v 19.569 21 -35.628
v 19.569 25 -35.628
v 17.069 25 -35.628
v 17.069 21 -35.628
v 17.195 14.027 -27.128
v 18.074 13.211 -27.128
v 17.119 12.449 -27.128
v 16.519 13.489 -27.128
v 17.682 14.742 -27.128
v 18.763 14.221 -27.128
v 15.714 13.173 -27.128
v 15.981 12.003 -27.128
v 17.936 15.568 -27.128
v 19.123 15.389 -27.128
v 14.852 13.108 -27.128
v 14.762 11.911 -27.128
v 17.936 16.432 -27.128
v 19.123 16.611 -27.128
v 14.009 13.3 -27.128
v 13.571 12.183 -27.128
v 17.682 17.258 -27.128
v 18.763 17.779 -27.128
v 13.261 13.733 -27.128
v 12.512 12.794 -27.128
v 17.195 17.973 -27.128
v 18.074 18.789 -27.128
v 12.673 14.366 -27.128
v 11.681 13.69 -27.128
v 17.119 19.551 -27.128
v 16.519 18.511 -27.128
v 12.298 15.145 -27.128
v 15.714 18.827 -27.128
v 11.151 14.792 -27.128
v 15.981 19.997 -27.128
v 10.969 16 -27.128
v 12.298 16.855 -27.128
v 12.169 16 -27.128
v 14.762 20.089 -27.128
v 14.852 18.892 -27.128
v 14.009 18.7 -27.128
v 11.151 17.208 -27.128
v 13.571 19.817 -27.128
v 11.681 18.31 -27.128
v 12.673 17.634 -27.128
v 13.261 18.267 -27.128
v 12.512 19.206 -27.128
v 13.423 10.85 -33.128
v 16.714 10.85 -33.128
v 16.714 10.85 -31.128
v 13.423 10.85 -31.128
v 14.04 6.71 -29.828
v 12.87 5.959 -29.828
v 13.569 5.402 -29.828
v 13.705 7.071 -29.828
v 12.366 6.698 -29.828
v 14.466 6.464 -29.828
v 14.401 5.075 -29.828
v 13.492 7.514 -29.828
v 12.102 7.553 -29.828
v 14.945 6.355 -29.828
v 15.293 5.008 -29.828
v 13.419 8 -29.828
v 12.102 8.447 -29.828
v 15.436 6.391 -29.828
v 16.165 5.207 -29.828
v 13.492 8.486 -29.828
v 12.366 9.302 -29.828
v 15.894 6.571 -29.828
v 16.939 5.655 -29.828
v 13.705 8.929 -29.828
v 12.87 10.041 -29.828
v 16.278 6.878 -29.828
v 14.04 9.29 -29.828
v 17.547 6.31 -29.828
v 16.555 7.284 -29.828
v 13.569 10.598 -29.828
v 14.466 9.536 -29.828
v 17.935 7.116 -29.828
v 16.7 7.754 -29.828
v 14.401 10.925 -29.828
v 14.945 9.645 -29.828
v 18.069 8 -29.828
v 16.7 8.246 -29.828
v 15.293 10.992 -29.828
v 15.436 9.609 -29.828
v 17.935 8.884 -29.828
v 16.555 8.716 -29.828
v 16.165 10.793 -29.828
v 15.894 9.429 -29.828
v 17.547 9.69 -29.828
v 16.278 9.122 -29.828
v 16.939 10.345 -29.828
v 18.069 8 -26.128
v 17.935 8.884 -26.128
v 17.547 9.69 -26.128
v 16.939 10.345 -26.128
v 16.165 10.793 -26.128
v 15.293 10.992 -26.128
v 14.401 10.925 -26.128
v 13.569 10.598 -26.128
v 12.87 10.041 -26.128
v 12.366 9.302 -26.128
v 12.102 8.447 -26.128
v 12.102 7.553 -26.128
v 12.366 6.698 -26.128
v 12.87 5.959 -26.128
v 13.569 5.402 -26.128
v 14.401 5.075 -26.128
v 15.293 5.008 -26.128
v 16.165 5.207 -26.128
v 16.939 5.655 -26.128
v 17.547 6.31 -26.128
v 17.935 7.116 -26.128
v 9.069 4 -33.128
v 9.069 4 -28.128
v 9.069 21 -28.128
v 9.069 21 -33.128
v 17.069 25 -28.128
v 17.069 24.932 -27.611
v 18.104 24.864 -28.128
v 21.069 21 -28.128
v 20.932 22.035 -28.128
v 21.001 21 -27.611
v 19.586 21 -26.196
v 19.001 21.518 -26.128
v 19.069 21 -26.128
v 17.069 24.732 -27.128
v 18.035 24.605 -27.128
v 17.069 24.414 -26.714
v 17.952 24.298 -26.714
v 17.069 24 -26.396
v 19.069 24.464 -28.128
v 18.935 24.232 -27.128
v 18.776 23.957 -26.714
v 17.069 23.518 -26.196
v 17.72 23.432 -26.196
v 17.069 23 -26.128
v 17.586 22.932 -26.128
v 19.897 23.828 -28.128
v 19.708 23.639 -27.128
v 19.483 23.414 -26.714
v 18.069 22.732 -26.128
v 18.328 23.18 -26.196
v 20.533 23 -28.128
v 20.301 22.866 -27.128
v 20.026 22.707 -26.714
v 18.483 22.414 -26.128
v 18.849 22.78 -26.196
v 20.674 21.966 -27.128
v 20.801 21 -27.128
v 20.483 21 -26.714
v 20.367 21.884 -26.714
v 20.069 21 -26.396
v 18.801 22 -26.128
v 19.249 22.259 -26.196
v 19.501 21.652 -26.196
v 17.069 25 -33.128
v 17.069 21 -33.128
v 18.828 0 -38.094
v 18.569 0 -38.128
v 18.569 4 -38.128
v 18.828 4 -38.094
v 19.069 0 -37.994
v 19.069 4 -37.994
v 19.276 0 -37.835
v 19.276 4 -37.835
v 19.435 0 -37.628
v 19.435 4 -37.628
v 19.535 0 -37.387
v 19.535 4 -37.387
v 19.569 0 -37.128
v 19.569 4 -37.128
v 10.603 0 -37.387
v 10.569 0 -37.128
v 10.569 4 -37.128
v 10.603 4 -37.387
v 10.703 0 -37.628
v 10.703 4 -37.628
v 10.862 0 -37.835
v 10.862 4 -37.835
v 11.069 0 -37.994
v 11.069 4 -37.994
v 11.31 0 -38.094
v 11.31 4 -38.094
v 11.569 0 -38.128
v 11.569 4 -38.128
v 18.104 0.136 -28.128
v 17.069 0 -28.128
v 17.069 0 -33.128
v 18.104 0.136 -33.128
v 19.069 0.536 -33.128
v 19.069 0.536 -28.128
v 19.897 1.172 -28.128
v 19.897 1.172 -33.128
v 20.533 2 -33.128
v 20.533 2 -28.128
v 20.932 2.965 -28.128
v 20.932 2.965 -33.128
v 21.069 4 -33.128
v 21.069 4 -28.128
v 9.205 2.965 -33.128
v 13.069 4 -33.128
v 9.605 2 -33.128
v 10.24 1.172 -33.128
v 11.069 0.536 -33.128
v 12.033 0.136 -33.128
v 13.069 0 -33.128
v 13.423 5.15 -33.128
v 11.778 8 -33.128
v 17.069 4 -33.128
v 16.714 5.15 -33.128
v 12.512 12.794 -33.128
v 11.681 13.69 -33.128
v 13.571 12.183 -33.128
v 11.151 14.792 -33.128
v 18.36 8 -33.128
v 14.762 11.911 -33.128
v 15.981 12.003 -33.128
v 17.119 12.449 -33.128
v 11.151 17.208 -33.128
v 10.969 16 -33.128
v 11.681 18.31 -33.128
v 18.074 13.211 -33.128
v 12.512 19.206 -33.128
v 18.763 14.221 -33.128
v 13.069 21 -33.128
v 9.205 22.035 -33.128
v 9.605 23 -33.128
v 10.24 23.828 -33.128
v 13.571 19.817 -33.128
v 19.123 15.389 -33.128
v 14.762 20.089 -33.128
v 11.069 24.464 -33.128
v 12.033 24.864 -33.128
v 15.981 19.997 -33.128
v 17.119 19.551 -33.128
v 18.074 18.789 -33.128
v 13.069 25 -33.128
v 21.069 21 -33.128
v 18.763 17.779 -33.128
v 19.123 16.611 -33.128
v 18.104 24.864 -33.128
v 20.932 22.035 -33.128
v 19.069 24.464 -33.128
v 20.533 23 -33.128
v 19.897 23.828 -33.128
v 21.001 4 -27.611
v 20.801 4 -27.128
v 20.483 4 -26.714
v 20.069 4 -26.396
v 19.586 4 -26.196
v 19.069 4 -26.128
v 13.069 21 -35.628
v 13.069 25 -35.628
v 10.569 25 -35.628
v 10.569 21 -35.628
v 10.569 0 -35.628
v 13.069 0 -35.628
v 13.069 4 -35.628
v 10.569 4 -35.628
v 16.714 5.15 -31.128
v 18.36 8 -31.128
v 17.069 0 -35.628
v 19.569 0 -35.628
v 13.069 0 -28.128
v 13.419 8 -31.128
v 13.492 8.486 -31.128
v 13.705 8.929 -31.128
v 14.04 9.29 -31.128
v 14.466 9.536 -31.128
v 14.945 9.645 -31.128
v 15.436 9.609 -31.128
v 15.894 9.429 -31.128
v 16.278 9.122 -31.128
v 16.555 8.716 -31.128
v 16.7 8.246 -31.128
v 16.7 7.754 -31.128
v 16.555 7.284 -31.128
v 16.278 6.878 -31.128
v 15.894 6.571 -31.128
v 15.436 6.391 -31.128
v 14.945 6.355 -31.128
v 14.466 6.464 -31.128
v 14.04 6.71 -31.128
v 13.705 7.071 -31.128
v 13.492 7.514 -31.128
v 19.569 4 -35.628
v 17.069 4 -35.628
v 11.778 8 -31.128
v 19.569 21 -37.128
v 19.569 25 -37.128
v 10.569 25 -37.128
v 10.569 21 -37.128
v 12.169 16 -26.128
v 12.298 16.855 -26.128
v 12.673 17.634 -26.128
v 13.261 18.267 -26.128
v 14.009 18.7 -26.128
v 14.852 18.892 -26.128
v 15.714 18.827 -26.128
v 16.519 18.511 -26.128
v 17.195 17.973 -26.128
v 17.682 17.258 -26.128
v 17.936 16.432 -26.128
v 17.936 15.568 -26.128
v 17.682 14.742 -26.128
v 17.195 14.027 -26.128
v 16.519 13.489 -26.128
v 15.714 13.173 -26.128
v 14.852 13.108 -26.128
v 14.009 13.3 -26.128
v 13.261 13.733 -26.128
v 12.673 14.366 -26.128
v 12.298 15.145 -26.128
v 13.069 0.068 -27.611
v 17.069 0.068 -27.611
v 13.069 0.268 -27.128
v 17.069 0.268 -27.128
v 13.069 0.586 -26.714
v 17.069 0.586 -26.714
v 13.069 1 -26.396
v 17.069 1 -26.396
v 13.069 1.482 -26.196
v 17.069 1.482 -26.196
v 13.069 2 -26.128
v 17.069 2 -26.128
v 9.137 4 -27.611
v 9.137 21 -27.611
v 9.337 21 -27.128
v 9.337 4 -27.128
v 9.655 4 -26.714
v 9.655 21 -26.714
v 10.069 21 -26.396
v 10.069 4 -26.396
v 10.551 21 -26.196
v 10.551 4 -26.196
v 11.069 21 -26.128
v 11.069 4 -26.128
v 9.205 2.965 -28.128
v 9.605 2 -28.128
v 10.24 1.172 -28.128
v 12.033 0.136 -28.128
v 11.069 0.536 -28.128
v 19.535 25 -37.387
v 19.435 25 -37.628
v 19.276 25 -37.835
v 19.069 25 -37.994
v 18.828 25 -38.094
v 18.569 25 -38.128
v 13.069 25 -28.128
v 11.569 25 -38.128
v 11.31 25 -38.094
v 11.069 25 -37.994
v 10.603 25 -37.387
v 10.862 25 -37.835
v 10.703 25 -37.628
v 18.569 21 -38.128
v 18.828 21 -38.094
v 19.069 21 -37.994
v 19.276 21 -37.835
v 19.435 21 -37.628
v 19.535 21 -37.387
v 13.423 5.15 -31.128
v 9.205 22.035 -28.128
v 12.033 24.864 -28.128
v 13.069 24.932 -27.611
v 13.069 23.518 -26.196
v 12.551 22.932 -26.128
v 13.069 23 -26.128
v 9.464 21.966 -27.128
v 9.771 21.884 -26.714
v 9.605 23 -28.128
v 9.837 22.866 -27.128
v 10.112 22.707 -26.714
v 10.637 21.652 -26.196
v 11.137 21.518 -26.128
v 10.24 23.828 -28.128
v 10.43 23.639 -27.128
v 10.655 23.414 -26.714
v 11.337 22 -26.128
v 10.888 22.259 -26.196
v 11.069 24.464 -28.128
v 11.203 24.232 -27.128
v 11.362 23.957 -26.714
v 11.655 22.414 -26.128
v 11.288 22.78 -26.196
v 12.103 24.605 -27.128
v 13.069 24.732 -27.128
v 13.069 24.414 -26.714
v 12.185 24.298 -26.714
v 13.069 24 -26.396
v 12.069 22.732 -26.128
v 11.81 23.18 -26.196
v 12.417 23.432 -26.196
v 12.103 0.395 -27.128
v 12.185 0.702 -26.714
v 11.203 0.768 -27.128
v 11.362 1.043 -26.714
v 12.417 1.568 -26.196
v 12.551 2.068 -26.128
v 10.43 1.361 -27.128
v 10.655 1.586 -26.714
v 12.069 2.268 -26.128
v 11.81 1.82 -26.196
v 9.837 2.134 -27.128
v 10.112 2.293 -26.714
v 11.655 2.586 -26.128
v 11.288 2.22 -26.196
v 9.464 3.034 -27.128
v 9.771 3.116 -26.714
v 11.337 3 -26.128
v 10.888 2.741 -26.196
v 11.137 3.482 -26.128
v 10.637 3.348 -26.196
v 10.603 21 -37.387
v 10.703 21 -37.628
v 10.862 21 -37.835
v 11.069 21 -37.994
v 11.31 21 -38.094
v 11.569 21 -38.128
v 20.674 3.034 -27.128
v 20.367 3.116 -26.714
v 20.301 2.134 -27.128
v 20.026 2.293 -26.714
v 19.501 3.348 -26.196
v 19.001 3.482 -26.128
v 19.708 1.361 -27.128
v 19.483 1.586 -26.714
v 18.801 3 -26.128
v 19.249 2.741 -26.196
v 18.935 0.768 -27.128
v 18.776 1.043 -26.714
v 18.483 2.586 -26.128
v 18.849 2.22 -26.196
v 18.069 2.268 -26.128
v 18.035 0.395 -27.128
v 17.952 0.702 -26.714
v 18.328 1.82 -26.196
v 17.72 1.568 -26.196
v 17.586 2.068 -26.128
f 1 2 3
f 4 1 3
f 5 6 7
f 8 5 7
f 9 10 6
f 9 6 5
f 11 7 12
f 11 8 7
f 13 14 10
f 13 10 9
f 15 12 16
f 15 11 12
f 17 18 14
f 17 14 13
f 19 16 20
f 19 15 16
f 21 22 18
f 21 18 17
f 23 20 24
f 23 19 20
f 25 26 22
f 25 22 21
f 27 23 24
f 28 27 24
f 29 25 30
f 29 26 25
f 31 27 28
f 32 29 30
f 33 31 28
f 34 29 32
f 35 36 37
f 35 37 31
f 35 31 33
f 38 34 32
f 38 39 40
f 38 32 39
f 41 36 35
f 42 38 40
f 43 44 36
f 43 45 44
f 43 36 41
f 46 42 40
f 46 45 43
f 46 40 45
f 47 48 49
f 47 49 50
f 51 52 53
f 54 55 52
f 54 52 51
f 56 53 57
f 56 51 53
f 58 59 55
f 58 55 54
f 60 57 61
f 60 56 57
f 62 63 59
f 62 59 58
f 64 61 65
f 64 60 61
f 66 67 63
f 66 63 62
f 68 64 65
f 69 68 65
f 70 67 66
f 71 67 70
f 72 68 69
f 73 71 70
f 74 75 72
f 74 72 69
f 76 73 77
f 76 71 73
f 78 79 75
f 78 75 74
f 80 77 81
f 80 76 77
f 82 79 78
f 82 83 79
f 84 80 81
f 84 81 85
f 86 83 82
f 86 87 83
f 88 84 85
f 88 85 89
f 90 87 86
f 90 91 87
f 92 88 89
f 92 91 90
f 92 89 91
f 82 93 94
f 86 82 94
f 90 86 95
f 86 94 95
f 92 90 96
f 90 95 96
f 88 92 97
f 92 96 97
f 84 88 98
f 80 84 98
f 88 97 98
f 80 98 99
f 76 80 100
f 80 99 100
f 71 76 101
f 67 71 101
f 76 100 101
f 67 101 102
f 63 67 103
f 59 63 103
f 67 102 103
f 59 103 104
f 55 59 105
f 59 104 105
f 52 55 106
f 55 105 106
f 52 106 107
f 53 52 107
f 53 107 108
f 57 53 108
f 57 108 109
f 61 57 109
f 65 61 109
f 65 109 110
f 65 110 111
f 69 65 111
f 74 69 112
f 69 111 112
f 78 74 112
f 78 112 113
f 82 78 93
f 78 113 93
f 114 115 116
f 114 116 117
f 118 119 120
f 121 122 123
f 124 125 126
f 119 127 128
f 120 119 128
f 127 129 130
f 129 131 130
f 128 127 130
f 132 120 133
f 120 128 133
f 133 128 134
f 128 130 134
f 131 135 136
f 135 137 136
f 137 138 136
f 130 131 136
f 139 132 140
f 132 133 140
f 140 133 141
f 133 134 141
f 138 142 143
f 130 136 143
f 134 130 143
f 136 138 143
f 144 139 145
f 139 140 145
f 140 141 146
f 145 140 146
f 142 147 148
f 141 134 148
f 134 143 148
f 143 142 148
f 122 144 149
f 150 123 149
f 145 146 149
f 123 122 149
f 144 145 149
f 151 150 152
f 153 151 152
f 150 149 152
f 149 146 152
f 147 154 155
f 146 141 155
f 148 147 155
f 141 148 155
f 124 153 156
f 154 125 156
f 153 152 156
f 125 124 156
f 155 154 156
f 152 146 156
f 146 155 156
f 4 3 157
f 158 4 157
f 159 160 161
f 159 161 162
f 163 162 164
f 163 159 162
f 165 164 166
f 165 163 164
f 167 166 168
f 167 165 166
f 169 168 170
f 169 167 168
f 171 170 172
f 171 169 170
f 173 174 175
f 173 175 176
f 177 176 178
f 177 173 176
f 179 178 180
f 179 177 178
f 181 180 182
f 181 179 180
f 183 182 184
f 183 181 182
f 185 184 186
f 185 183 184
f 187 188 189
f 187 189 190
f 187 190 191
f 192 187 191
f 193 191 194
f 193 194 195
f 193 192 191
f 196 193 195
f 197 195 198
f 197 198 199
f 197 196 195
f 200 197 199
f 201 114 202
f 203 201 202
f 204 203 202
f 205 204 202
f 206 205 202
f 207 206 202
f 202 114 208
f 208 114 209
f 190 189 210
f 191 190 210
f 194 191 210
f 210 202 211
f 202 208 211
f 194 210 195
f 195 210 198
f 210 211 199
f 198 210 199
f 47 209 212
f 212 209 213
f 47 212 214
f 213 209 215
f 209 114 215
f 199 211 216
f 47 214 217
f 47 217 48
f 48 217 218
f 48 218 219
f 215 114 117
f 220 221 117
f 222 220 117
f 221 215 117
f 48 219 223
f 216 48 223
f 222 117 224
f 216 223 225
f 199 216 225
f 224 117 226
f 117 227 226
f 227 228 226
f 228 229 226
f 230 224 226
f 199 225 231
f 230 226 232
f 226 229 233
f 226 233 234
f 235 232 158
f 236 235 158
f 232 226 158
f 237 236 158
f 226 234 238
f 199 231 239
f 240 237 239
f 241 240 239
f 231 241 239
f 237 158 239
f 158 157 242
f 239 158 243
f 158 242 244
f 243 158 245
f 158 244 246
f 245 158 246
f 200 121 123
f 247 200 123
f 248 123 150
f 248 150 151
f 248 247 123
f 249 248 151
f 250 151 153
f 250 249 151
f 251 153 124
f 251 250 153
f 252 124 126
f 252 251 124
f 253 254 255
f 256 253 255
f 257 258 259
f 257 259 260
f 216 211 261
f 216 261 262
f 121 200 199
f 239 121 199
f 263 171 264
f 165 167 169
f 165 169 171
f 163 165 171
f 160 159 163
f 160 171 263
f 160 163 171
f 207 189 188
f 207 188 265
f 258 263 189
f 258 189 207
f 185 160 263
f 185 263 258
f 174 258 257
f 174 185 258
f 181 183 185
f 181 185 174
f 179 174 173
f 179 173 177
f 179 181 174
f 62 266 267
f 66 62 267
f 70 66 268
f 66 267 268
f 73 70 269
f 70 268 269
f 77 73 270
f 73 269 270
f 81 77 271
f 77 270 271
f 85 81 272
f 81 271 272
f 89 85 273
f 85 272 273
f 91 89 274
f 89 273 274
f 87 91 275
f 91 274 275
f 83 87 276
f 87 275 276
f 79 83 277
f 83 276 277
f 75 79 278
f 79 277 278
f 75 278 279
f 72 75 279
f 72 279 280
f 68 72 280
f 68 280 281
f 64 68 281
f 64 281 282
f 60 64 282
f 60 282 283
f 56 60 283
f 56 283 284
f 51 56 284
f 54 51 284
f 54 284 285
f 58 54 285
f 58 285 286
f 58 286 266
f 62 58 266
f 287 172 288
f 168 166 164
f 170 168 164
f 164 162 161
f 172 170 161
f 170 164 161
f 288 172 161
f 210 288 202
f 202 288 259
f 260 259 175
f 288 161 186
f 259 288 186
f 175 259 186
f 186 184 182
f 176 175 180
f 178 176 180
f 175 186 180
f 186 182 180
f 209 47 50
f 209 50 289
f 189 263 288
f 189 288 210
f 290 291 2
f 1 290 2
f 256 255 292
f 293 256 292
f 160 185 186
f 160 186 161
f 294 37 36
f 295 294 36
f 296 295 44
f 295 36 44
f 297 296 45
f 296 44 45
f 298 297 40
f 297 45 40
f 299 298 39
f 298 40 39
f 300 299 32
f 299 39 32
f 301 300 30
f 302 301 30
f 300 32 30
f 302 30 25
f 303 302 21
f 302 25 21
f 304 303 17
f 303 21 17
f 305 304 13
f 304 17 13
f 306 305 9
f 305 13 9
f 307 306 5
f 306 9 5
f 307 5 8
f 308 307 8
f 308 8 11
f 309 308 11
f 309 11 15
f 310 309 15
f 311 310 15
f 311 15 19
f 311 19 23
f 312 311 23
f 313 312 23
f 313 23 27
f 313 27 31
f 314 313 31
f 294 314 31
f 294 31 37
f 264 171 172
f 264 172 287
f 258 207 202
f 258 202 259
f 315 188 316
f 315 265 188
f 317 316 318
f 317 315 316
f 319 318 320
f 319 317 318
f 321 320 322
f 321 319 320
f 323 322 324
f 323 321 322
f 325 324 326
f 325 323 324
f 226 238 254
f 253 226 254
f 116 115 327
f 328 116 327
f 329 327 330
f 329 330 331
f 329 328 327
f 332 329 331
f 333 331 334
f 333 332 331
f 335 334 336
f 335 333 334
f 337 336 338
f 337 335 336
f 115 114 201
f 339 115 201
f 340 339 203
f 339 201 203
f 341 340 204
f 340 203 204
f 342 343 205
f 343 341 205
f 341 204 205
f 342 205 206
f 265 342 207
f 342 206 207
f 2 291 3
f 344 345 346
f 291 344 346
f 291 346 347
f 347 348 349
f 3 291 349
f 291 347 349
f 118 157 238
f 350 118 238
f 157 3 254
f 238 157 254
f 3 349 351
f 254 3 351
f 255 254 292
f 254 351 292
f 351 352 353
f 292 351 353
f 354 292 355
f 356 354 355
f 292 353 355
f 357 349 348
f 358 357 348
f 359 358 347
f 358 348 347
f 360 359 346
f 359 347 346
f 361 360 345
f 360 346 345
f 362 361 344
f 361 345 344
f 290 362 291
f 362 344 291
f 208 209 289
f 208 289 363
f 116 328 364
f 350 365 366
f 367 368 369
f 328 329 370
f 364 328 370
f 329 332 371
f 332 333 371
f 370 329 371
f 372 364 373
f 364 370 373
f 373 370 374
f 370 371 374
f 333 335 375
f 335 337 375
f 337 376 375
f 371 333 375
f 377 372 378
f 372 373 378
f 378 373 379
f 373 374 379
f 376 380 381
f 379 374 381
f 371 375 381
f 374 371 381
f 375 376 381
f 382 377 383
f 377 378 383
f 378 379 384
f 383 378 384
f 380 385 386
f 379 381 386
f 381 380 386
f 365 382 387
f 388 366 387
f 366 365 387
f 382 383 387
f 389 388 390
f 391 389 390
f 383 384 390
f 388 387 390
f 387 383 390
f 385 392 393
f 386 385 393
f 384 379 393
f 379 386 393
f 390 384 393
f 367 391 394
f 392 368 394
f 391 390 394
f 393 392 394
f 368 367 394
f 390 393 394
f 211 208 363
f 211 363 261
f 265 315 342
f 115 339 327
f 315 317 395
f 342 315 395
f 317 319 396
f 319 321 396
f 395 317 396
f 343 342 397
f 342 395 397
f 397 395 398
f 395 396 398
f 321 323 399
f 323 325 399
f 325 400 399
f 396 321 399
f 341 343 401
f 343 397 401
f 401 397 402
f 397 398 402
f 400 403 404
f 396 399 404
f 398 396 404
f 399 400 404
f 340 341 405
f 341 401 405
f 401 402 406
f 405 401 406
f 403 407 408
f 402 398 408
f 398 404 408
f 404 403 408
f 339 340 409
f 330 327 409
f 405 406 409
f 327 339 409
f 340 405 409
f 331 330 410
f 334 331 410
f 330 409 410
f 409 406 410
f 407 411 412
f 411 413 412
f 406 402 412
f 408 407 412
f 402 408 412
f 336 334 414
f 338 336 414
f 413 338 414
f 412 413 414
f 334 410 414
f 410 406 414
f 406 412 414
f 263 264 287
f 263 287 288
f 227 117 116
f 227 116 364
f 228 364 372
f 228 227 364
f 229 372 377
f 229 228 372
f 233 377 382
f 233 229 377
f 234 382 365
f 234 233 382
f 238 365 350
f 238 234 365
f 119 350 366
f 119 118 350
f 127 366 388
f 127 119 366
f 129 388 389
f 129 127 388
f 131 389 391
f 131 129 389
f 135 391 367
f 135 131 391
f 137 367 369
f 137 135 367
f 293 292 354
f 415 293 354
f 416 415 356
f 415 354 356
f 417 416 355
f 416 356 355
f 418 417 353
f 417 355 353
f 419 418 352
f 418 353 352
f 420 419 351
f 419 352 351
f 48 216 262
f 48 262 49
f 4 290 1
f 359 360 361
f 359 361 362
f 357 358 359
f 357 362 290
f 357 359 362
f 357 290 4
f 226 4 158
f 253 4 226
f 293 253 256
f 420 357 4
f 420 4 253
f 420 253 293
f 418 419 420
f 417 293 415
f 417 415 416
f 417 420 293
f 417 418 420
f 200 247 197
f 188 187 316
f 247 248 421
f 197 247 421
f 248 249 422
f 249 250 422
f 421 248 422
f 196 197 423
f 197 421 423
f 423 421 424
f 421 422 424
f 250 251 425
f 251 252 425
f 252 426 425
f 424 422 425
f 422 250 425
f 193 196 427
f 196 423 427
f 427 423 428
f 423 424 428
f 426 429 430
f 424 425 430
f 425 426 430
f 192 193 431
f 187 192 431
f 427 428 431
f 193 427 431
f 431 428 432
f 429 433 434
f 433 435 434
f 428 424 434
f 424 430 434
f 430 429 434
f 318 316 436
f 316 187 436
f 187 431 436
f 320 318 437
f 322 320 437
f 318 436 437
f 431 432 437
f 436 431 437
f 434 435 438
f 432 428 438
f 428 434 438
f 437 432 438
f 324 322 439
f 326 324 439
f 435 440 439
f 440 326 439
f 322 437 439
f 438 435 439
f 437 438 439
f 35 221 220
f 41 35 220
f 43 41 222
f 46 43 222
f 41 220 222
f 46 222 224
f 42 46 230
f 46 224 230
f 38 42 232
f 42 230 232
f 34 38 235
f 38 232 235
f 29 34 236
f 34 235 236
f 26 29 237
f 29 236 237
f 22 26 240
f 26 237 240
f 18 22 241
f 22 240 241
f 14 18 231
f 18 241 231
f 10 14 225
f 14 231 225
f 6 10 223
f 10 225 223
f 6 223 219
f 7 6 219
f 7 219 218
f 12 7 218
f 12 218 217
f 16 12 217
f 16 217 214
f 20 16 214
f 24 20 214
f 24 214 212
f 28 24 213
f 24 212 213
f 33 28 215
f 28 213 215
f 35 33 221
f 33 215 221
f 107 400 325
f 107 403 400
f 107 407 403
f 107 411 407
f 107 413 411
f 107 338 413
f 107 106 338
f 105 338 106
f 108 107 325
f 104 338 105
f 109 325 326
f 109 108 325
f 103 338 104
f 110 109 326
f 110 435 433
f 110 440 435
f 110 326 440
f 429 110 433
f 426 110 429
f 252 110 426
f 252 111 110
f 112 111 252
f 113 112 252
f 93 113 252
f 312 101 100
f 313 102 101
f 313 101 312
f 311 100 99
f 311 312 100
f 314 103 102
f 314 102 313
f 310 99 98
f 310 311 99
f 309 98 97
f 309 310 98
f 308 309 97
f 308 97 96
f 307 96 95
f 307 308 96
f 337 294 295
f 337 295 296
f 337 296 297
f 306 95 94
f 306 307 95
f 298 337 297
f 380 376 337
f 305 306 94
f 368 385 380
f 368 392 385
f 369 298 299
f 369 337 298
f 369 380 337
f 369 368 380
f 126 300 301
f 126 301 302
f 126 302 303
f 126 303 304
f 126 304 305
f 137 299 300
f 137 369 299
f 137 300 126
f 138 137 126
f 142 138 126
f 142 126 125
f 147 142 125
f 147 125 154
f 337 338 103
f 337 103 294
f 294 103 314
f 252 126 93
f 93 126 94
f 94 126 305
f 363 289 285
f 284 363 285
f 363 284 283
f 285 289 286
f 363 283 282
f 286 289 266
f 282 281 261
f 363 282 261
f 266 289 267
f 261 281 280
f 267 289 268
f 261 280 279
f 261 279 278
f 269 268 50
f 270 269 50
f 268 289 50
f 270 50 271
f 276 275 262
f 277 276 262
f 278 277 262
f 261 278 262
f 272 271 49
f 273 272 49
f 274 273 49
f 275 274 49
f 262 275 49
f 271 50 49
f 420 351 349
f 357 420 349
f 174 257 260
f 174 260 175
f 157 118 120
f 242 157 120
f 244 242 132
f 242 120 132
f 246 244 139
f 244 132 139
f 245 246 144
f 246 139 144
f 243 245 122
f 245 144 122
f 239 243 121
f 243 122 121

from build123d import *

# Parameters (mm, degrees)
BOSS_EXTRU_3_DEPTH      = 4
ESQUISSE3_W             = 12
ESQUISSE3_H             = 7
BOSS_EXTRU_4_DEPTH      = 8.5
ENL_V_MAT_EXTRU_1_REACH = 9
ESQUISSE4_R             = 1.65
ESQUISSE4_R_2           = 2.9
ESQUISSE5_R             = 4.1
ENL_V_MAT_EXTRU_2_DEPTH = 6
CONG_1_R                = 4
CONG_2_R                = 2
ESQUISSE6_R             = 3
ENL_V_MAT_EXTRU_3_DEPTH = 3.7
ENL_V_MAT_EXTRU_4_DEPTH = 2


with BuildPart() as part:
    # Esquisse2 → Boss.-Extru.3 (new body)
    with BuildSketch(Plane(origin=(0, 0, 0), x_dir=(1, 0, 0), z_dir=(0, 1, 0))):
        with BuildLine():
            Line((11.568725398, 38.128215269), (18.568725398, 38.128215269))
            ThreePointArc((18.568725398, 38.128215269), (19.275832179, 37.83532205), (19.568725398, 37.128215269))
            Line((19.568725398, 37.128215269), (19.568725398, 35.628215269))
            Line((19.568725398, 35.628215269), (17.068725398, 35.628215269))
            Line((17.068725398, 35.628215269), (17.068725398, 33.128215269))
            Line((17.068725398, 33.128215269), (21.068725398, 33.128215269))
            Line((21.068725398, 33.128215269), (21.068725398, 26.128215269))
            Line((21.068725398, 26.128215269), (9.068725398, 26.128215269))
            Line((9.068725398, 26.128215269), (9.068725398, 33.128215269))
            Line((9.068725398, 33.128215269), (13.068725398, 33.128215269))
            Line((13.068725398, 33.128215269), (13.068725398, 35.628215269))
            Line((13.068725398, 35.628215269), (10.568725398, 35.628215269))
            Line((10.568725398, 35.628215269), (10.568725398, 37.128215269))
            ThreePointArc((10.568725398, 37.128215269), (10.861618616, 37.83532205), (11.568725398, 38.128215269))
        make_face()
    extrude(amount=BOSS_EXTRU_3_DEPTH)

    # Esquisse3 → Boss.-Extru.4 (add)
    with BuildSketch(Plane(origin=(0, 4, 0), x_dir=(1, 0, 0), z_dir=(0, 1, 0))):
        with Locations((15.068725398, 29.628215269)):
            Rectangle(ESQUISSE3_W, ESQUISSE3_H)
    extrude(amount=BOSS_EXTRU_4_DEPTH)

    # Symétrie1: part across plane


with BuildPart() as part_1:
    add(part.part)
    add(part.part.mirror(Plane.ZX.offset(12.5)))

    # Esquisse4 → Enlèv. mat.-Extru.1 (cut, up to next)
    with BuildSketch(Plane(origin=(0, 0, -33.128215269), x_dir=(-1, 0, 0), z_dir=(0, 0, -1)), mode=Mode.PRIVATE) as enl_v_mat_extru_1_sk1:
        with Locations((-15.068725398, 8)):
            Circle(ESQUISSE4_R)
    enl_v_mat_extru_1_tool1 = extrude(enl_v_mat_extru_1_sk1.sketch, amount=-ENL_V_MAT_EXTRU_1_REACH, mode=Mode.PRIVATE) & part_1.part
    add(enl_v_mat_extru_1_tool1.solids().sort_by_distance((15.068725, 8, -33.128215))[0], mode=Mode.SUBTRACT)
    # Esquisse4 → Enlèv. mat.-Extru.1 (cut, up to next)
    with BuildSketch(Plane(origin=(0, 0, -33.128215269), x_dir=(-1, 0, 0), z_dir=(0, 0, -1)), mode=Mode.PRIVATE) as enl_v_mat_extru_1_sk2:
        with Locations((-15.068725398, 16)):
            Circle(ESQUISSE4_R_2)
    enl_v_mat_extru_1_tool2 = extrude(enl_v_mat_extru_1_sk2.sketch, amount=-ENL_V_MAT_EXTRU_1_REACH, mode=Mode.PRIVATE) & part_1.part
    add(enl_v_mat_extru_1_tool2.solids().sort_by_distance((15.068725, 16, -33.128215))[0], mode=Mode.SUBTRACT)

    # Esquisse5 → Enlèv. mat.-Extru.2 (cut)
    with BuildSketch(Plane(origin=(0, 0, -33.128215269), x_dir=(-1, 0, 0), z_dir=(0, 0, -1))):
        with Locations((-15.068725398, 16)):
            Circle(ESQUISSE5_R)
    extrude(amount=-ENL_V_MAT_EXTRU_2_DEPTH, mode=Mode.SUBTRACT)

    # Congé1
    cong_1_edges = [part_1.edges().sort_by_distance(p)[0] for p in [
        (9.068725398, 0, -29.628215269),
        (9.068725398, 25, -29.628215269),
        (21.068725398, 0, -29.628215269),
        (21.068725398, 25, -29.628215269),
    ]]
    fillet(cong_1_edges, radius=CONG_1_R)

    # Congé2
    cong_2_edges = [part_1.edges().sort_by_distance(p)[0] for p in [
        (9.068725398, 12.5, -26.128215269),
        (15.068725398, 0, -26.128215269),
        (21.068725398, 12.5, -26.128215269),
        (15.068725398, 25, -26.128215269),
        (19.897152522, 23.828427125, -26.128215269),
        (19.897152522, 1.171572875, -26.128215269),
        (10.240298273, 23.828427125, -26.128215269),
        (10.240298273, 1.171572875, -26.128215269),
    ]]
    fillet(cong_2_edges, radius=CONG_2_R)

    # Esquisse6 → Enlèv. mat.-Extru.3 (cut)
    with BuildSketch(Plane.XY.offset(-26.128215269)):
        with Locations((15.068725398, 8)):
            Circle(ESQUISSE6_R)
    extrude(amount=-ENL_V_MAT_EXTRU_3_DEPTH, mode=Mode.SUBTRACT)

    # Esquisse7 → Enlèv. mat.-Extru.4 (cut)
    with BuildSketch(Plane(origin=(0, 0, -33.128215269), x_dir=(-1, 0, 0), z_dir=(0, 0, -1))):
        Polygon((-16.714173665, 10.85), (-13.42327713, 10.85), (-11.777828863, 8), (-13.42327713, 5.15), (-16.714173665, 5.15), (-18.359621932, 8), align=None)
    extrude(amount=-ENL_V_MAT_EXTRU_4_DEPTH, mode=Mode.SUBTRACT)


solid = part_1.part
